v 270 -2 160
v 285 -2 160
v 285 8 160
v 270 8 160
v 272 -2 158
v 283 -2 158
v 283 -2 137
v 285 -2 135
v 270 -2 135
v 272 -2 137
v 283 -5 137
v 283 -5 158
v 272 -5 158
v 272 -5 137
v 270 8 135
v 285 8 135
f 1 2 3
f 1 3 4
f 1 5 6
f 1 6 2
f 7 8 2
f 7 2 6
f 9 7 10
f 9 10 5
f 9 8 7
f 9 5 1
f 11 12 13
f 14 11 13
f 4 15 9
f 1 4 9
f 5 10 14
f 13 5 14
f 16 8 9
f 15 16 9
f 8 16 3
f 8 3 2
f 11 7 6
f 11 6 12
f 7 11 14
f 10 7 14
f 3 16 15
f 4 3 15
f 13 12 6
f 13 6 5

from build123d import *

# Parameters (mm, degrees)
BOX025_W                  = 11
BOX025_H                  = 7
BOX025_DEPTH              = 21
BOX024_W                  = 15
BOX024_H                  = 10
BOX024_DEPTH              = 25
FUSION005_PLACEMENT_ANGLE = 180


with BuildPart() as box025:
    # Box025 → Box025 (new body)
    with BuildSketch(Plane(origin=(227, 236, 227), x_dir=(1, 0, 0), z_dir=(0, 0, 1))):
        with Locations((5.5, 3.5)):
            Rectangle(BOX025_W, BOX025_H)
    extrude(amount=BOX025_DEPTH)


with BuildPart() as ac_plug_switch:
    # Box024 → Box024 (new body)
    with BuildSketch(Plane(origin=(225, 230, 225), x_dir=(1, 0, 0), z_dir=(0, 0, 1))):
        with Locations((7.5, 5)):
            Rectangle(BOX024_W, BOX024_H)
    extrude(amount=BOX024_DEPTH)

    # Fusion005: union Box025
    add(box025.part)


with BuildPart() as ac_plug_switch_1:
    # Fusion005 placement: moved
    add(ac_plug_switch.part.moved(Location((510, 238, -90))).rotate(Axis((510, 238, -90), (0, 0, 1)), FUSION005_PLACEMENT_ANGLE))


solid = ac_plug_switch_1.part
